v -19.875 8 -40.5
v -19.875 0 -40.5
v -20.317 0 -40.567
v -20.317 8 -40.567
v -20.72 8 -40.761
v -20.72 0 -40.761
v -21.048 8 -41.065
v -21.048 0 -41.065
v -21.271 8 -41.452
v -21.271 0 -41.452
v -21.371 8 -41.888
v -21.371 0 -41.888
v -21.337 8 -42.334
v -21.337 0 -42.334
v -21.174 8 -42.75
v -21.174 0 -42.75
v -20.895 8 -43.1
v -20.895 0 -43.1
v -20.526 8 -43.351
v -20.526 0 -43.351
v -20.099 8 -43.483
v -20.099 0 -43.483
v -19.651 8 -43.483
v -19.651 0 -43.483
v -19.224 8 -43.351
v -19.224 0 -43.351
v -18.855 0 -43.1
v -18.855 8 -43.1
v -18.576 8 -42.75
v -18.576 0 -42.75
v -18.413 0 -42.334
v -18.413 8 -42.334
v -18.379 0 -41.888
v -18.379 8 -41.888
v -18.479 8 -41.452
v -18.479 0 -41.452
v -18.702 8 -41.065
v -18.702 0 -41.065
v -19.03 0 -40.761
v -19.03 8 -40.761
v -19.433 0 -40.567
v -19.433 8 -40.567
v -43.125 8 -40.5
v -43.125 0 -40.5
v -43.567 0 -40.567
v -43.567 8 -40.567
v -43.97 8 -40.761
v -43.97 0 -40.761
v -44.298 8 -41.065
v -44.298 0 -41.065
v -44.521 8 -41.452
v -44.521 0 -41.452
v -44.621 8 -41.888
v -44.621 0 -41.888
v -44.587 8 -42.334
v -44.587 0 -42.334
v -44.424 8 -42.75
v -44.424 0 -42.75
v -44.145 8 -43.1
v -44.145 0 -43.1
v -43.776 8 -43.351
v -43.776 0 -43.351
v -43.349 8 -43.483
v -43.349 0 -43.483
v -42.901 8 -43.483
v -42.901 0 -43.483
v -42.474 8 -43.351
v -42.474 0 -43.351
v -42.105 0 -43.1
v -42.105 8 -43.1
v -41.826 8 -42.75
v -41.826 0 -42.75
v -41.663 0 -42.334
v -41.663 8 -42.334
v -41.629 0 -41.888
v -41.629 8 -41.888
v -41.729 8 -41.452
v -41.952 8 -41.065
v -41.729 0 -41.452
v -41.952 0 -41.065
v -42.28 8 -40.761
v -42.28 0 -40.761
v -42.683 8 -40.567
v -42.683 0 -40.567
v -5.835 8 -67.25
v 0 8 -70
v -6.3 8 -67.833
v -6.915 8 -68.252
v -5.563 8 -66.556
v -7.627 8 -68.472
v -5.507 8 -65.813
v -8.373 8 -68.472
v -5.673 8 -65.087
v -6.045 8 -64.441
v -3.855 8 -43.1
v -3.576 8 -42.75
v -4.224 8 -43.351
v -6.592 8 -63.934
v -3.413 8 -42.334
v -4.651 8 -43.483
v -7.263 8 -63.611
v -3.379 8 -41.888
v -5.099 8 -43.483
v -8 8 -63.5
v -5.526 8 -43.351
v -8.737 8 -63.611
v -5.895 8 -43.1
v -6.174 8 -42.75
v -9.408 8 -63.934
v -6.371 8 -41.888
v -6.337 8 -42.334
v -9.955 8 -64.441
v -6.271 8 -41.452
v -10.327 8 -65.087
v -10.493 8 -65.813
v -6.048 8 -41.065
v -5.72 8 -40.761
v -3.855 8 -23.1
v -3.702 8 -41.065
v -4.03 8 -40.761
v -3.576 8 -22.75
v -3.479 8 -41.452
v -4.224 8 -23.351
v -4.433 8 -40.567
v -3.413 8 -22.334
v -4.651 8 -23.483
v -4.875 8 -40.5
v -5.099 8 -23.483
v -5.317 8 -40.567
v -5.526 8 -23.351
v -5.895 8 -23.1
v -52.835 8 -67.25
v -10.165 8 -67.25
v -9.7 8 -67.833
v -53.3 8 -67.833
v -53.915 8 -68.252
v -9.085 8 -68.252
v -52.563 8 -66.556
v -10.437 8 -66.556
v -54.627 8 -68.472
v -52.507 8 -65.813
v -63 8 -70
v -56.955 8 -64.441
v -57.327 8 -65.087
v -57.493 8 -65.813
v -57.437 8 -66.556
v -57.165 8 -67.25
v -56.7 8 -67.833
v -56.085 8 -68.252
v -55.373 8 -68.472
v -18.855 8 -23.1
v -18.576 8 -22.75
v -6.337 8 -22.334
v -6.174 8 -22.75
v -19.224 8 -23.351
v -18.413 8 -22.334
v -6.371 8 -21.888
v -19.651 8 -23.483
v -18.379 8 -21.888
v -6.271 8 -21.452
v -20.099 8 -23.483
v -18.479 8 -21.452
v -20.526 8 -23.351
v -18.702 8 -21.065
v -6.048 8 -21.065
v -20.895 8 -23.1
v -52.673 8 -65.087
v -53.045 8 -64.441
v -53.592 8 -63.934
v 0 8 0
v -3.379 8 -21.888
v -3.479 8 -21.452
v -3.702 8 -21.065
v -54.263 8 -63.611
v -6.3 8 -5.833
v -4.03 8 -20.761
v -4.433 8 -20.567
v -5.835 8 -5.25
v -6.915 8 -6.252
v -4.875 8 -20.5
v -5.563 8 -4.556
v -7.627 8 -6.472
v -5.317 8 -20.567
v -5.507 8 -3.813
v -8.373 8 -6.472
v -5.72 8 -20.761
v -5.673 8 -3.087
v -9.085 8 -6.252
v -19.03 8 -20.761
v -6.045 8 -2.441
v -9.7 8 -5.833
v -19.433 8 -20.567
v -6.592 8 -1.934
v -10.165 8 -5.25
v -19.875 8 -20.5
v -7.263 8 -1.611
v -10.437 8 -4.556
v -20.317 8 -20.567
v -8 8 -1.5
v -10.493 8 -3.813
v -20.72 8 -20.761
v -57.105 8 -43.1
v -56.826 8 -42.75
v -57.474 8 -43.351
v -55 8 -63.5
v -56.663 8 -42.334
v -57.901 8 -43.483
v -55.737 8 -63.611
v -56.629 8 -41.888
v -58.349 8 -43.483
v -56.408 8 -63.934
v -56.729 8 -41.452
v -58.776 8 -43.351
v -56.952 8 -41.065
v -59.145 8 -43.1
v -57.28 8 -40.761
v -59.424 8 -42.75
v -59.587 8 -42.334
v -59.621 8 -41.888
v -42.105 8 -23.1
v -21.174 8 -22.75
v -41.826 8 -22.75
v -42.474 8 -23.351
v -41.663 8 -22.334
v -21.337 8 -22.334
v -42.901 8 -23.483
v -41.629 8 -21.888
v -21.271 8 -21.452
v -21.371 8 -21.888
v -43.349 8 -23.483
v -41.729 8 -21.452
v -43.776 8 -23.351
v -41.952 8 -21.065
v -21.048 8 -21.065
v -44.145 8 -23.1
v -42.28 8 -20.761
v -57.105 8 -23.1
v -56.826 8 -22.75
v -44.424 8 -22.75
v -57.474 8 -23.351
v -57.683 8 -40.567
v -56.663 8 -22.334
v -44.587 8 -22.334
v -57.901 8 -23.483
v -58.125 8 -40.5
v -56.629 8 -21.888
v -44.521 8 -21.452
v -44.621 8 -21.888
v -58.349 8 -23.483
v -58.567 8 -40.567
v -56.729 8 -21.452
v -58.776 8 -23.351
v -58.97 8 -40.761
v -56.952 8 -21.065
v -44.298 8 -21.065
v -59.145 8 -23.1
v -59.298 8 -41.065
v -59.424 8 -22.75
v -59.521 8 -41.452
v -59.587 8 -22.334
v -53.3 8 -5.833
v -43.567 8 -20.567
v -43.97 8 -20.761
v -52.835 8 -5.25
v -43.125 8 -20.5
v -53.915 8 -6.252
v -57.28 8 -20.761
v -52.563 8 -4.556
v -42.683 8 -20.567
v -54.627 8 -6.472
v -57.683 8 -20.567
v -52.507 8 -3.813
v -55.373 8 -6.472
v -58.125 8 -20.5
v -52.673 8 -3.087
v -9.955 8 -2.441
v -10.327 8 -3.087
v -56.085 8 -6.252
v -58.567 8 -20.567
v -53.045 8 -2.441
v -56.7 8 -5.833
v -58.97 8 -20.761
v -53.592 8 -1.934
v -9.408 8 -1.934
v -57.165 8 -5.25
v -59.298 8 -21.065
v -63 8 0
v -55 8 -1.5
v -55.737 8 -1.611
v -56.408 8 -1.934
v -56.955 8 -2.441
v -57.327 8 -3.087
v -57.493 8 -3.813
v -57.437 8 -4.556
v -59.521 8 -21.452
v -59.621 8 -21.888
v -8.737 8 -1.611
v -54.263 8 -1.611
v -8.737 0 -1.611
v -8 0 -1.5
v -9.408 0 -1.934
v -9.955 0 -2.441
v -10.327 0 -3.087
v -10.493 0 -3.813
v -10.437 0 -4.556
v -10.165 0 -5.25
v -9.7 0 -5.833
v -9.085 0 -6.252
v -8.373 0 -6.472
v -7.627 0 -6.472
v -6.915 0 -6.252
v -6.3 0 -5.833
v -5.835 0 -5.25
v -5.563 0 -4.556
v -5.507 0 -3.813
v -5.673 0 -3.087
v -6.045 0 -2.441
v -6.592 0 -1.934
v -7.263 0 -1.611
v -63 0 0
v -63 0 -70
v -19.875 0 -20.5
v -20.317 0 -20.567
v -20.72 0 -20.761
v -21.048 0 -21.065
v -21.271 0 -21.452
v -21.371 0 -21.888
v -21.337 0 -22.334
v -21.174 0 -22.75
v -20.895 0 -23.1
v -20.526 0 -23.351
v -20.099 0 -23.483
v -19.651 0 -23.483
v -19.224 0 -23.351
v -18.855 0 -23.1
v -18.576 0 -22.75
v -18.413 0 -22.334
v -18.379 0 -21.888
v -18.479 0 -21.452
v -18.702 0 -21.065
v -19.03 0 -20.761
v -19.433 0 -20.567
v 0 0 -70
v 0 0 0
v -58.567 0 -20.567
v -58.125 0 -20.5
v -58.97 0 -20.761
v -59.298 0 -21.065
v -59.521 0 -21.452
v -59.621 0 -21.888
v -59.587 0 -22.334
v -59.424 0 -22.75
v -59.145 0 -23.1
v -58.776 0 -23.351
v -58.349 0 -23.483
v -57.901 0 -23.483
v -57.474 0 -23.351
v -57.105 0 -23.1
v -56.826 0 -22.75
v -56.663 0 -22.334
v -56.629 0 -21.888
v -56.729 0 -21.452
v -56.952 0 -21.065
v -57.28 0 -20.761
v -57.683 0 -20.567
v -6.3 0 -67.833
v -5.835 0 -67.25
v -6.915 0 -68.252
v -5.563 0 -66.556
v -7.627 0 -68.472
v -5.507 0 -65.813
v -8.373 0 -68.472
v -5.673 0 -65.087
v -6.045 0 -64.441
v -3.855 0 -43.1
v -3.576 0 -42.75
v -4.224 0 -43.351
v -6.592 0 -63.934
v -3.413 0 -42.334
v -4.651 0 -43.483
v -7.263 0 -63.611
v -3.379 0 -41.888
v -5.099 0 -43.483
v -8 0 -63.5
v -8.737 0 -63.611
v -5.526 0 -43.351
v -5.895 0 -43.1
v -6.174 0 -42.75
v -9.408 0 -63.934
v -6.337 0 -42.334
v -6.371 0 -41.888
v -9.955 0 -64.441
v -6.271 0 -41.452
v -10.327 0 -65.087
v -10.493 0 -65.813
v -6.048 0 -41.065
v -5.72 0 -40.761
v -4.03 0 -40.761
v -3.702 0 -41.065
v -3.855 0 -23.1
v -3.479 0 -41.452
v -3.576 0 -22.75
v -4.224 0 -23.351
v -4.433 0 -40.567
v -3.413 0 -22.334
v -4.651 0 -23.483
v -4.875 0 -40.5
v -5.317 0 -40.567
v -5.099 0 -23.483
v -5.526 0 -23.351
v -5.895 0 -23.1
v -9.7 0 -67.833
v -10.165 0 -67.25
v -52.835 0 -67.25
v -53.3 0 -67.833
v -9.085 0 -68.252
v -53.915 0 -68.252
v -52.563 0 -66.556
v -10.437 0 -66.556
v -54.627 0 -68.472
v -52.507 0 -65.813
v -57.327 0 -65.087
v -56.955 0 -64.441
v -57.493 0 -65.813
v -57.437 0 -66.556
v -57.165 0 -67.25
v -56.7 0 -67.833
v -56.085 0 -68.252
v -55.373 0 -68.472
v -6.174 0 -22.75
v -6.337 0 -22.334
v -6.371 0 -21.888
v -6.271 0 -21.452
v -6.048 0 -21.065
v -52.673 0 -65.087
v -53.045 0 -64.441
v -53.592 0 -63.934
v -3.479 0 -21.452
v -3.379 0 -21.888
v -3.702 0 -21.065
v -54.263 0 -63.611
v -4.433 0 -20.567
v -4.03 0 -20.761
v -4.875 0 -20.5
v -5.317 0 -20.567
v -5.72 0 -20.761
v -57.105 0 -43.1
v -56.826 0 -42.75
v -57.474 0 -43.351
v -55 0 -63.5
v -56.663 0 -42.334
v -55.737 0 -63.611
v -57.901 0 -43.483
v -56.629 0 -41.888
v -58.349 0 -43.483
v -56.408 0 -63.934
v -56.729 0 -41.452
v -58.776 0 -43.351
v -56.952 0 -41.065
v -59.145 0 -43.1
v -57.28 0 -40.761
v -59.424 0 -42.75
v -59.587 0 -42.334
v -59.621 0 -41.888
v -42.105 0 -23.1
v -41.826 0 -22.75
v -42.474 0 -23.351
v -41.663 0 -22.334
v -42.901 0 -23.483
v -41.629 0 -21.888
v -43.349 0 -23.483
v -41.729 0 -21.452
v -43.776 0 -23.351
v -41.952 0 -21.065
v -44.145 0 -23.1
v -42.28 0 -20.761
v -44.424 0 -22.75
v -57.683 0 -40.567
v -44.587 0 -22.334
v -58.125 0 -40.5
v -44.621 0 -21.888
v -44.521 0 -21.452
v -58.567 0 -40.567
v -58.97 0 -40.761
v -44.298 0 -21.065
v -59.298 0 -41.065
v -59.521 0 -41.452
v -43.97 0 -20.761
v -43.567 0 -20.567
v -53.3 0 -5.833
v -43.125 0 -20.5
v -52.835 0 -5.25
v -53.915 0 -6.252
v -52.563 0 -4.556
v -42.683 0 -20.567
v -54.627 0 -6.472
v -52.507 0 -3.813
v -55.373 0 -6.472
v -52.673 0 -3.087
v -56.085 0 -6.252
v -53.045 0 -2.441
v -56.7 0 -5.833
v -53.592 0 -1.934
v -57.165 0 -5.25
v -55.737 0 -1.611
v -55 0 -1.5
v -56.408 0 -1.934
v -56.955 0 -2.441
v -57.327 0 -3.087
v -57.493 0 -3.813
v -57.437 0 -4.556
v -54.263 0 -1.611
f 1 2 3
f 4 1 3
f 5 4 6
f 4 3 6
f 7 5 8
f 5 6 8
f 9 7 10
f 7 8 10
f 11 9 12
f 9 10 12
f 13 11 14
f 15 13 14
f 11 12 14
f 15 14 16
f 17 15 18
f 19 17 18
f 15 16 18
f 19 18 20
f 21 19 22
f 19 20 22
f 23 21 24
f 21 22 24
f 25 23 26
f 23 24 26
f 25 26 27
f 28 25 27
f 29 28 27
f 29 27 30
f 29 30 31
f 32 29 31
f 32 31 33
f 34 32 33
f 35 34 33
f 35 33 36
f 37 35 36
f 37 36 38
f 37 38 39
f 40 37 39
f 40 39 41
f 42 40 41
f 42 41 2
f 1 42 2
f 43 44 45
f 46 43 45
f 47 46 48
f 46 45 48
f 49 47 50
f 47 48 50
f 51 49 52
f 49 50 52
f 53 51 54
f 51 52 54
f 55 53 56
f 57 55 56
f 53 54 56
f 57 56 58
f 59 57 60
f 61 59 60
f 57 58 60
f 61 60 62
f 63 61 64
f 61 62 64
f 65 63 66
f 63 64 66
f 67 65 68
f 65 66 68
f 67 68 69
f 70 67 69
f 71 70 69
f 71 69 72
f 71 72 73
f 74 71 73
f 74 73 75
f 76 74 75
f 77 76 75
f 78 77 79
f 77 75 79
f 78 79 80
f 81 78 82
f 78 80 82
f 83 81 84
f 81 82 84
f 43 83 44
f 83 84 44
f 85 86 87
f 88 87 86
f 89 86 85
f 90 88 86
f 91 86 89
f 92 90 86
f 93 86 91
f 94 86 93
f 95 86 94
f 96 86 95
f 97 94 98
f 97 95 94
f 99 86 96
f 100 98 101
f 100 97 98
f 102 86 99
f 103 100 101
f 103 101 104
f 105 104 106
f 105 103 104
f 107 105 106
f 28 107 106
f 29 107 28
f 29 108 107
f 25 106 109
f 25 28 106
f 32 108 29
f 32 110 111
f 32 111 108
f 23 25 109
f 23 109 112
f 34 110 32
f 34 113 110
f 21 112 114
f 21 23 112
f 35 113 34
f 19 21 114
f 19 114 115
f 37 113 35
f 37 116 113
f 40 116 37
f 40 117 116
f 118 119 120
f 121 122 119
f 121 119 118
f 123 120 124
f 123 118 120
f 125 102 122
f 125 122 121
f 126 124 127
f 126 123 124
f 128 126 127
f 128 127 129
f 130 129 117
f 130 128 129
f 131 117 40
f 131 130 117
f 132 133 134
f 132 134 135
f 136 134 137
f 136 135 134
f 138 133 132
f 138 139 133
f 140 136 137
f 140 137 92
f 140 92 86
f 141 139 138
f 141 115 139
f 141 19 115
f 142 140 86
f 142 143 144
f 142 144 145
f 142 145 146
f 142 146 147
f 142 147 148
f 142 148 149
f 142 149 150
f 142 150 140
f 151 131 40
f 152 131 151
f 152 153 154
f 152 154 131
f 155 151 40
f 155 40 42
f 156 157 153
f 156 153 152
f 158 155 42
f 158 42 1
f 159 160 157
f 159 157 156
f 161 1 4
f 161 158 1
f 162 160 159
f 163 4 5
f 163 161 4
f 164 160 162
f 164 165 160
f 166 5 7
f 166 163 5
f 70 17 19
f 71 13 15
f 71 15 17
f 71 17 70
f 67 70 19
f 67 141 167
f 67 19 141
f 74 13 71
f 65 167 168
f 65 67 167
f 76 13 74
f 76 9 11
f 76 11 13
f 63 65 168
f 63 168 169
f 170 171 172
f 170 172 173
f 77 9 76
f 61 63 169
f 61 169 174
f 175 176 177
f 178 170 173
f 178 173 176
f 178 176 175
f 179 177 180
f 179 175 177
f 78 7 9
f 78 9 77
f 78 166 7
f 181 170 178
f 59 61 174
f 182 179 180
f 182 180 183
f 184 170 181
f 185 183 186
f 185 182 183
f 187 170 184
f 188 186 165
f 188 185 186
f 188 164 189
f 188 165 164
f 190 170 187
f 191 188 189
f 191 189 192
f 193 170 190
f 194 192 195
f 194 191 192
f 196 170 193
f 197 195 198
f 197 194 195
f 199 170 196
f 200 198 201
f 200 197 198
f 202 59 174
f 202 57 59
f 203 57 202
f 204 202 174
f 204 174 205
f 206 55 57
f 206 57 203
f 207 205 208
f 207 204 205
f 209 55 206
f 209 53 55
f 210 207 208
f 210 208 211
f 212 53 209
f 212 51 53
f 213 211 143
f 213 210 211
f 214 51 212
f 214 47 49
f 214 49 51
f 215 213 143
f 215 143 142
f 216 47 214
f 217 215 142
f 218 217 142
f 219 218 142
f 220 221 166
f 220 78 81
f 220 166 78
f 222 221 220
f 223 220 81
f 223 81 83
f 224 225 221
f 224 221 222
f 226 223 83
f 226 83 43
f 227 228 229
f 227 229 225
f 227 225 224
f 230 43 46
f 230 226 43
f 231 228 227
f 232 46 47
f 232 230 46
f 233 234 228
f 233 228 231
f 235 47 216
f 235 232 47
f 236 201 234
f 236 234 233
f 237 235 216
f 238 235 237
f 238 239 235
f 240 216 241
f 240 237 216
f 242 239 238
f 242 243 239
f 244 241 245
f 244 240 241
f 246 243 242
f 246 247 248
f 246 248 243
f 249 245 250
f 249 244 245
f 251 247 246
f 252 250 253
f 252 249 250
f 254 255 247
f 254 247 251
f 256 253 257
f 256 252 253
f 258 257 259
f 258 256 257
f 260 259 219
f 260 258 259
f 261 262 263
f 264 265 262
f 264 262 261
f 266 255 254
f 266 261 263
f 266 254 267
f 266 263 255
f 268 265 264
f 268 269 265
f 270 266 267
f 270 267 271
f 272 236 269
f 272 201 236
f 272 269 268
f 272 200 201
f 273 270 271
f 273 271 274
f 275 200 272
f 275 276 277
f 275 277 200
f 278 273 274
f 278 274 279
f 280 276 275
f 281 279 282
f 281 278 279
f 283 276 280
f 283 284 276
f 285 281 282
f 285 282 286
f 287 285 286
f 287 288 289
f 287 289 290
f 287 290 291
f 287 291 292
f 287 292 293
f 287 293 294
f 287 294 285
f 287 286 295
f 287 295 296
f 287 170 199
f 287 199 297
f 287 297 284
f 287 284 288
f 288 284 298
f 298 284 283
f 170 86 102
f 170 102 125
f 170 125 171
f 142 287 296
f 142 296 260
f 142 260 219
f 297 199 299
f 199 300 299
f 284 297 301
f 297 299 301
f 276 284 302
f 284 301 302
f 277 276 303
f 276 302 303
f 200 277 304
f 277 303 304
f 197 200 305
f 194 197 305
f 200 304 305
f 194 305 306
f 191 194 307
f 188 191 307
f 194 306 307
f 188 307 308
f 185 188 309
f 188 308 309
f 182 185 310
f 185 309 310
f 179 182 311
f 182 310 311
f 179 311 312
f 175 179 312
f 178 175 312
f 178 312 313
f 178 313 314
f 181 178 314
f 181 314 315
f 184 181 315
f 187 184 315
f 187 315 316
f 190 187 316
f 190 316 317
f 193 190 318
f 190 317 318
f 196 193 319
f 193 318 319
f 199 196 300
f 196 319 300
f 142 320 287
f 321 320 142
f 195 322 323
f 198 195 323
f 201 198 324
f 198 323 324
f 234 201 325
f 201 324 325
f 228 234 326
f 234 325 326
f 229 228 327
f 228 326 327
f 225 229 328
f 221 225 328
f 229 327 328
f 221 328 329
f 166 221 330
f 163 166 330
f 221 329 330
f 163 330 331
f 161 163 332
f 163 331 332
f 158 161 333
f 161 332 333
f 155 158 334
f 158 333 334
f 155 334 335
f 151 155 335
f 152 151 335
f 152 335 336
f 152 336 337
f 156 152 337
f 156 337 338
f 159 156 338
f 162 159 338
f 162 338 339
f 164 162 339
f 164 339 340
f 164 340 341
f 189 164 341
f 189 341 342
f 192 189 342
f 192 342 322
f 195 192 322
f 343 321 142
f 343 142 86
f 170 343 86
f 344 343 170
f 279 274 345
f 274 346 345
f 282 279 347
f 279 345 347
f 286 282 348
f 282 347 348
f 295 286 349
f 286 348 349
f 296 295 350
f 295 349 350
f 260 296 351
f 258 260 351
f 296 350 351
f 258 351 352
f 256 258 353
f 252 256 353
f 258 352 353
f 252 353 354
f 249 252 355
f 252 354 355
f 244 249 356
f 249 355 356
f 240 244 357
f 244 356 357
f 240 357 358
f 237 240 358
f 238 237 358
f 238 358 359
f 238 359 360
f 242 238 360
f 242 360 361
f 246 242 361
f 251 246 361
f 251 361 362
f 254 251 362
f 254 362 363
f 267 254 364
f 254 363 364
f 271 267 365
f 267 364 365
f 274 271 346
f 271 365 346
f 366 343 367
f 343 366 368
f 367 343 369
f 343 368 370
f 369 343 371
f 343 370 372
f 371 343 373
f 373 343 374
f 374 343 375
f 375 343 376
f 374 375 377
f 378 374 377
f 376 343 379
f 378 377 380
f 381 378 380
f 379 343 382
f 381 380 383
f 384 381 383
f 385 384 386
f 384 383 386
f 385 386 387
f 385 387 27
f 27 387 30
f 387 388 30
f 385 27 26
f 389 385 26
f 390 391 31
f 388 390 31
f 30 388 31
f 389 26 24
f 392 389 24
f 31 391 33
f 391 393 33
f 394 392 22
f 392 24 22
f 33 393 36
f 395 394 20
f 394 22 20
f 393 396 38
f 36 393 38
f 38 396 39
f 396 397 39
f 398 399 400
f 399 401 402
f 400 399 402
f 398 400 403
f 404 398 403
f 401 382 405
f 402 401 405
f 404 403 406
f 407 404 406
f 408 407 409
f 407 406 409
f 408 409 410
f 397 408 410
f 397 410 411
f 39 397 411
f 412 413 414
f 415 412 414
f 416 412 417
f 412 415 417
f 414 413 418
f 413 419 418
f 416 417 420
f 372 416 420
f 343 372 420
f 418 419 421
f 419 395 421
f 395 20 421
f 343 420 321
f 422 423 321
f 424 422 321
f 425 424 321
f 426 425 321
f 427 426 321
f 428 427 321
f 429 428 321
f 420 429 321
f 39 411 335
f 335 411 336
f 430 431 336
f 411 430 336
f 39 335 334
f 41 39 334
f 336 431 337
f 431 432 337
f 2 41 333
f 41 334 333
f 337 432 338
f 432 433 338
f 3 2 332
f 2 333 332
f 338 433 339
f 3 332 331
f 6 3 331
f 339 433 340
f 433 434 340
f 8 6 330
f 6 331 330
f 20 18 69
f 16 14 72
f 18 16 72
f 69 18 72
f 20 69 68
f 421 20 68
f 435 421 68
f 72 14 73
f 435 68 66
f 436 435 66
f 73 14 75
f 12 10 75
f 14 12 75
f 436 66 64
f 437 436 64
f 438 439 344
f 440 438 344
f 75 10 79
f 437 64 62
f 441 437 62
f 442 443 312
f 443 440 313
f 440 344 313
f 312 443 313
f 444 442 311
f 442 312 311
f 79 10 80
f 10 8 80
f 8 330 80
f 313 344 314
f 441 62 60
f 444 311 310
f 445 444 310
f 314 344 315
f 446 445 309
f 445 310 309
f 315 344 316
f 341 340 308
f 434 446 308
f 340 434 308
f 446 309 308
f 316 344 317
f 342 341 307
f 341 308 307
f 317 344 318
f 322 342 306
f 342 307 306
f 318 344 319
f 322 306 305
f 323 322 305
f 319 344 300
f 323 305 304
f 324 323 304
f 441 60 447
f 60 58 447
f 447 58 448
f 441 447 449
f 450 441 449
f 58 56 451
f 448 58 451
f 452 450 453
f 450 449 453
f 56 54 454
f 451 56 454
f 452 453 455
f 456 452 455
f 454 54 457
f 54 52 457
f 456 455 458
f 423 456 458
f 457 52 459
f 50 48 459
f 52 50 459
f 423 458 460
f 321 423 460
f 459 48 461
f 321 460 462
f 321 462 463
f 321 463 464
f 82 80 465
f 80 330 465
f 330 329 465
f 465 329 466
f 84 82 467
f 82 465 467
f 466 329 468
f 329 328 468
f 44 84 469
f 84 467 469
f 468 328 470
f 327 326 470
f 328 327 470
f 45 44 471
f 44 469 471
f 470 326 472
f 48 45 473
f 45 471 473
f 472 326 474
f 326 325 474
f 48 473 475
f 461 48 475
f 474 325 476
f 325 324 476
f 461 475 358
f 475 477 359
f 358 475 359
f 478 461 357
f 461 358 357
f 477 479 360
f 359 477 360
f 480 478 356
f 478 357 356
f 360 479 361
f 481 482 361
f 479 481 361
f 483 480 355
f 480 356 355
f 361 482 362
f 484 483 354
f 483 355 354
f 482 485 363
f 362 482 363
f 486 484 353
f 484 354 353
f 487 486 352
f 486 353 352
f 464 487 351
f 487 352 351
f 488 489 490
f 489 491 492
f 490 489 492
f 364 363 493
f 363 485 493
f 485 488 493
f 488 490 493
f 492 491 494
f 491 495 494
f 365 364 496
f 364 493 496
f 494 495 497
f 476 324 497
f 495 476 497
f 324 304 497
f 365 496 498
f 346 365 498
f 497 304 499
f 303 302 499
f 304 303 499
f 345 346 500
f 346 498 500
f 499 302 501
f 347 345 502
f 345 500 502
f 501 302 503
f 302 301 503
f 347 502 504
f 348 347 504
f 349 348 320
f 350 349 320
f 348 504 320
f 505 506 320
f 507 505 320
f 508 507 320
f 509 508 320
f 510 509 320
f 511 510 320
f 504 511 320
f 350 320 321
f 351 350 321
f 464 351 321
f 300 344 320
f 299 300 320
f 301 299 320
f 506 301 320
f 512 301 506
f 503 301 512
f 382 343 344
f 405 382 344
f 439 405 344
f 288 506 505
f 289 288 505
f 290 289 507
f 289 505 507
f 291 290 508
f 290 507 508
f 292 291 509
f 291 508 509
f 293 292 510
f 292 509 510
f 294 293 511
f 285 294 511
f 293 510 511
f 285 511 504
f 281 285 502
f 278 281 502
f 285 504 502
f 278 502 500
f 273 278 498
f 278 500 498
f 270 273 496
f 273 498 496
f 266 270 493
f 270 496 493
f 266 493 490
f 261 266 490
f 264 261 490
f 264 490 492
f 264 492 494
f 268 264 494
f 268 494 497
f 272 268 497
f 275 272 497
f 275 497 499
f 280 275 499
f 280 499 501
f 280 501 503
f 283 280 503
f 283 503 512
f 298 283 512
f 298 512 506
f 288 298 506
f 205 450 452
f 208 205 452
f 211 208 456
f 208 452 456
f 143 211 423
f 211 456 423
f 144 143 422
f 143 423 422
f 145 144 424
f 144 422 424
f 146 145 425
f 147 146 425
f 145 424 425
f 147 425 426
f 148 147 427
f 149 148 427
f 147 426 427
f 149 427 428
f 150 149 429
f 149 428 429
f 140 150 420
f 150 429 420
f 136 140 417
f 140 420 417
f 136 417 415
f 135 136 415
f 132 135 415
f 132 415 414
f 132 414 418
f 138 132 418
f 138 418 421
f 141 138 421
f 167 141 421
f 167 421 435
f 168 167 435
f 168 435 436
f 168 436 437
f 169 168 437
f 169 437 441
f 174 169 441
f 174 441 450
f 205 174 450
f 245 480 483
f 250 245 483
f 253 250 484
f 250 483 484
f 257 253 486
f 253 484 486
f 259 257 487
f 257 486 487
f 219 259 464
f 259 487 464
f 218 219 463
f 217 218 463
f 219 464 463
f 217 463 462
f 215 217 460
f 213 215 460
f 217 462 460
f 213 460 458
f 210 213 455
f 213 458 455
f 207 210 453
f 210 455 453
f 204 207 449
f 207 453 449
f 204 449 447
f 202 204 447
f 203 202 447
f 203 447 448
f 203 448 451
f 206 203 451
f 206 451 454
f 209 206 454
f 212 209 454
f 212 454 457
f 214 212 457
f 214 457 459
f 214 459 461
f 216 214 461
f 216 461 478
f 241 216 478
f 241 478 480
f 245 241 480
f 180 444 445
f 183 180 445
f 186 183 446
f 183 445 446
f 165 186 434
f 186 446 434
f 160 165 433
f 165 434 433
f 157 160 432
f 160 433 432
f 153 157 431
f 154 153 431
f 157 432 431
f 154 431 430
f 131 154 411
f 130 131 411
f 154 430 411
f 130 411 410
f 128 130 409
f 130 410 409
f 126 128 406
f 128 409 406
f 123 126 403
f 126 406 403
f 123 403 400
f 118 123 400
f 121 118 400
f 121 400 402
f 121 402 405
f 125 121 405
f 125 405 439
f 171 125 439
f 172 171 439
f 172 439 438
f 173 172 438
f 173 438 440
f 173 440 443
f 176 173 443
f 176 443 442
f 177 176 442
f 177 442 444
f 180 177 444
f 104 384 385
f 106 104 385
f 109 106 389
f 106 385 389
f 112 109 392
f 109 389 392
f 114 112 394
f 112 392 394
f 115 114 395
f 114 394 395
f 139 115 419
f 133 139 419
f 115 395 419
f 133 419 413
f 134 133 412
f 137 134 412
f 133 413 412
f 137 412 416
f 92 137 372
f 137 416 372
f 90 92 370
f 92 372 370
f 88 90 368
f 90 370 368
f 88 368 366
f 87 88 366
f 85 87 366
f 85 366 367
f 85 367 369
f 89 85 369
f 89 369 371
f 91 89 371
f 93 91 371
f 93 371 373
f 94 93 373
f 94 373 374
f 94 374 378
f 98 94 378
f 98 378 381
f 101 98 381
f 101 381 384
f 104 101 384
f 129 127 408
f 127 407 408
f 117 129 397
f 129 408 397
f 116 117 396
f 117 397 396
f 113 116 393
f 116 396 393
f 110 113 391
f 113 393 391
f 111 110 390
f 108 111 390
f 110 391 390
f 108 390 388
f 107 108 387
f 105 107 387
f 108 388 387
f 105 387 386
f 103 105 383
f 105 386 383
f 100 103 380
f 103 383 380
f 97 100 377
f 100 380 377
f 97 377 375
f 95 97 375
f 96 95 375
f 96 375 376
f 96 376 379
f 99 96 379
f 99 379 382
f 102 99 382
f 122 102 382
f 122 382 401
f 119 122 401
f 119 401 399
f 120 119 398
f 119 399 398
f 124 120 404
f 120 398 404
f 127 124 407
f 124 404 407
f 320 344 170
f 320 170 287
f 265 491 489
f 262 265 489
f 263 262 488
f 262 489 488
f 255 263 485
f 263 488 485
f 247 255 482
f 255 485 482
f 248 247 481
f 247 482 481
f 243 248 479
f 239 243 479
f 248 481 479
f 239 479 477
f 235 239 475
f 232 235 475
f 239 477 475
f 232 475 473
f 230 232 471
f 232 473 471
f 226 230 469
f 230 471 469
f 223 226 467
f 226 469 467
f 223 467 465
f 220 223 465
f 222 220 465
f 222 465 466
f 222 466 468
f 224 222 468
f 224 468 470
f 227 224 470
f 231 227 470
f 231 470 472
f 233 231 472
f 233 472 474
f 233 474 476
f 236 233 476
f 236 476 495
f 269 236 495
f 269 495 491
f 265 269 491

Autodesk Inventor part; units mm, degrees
ref_plane "YZ Plane" through (0, 0, 0) normal (1, 0, 0) x (0, 1, 0)
ref_plane "XZ Plane" through (0, 0, 0) normal (0, 1, 0) x (-1, 0, 0)
ref_plane "XY Plane" through (0, 0, 0) normal (0, 0, 1) x (1, 0, 0)
sketch "Sketch1" plane through (0, 0, 0) normal (0, 1, 0) x (-1, 0, 0)
  line L0 (0, 0) -> (63, 0)
  line L1 (63, 0) -> (63, -70)
  line L2 (63, -70) -> (0, -70)
  line L3 (0, -70) -> (0, 0)
  dimension "d0" = 70
  dimension "d1" = 63
extrude "Extrusion1" add sketch "Sketch1" along normal blind 8
sketch "Sketch2" plane through (0, 8, 0) normal (0, 1, 0) x (1, 0, 0)
  line L0 (0, 70) -> (-63, 70) projected
  line L1 (-63, 70) -> (-63, 0) projected
  line L2 (0, 0) -> (0, 70) projected
  point P0 (-58.125, 42)
  point P1 (-43.125, 42)
  point P2 (-58.125, 22)
  point P3 (-43.125, 22)
  point P4 (-19.875, 42)
  point P5 (-19.875, 22)
  point P6 (-4.875, 42)
  point P7 (-4.875, 22)
  dimension "d4" = 70
  dimension "d5" = 63
  dimension "d8" = 15
  dimension "d11" = 20
  dimension "d18" = 20
  dimension "d21" = 15
  dimension "d24" = 23.25
  dimension "d25" = 0
  dimension "d26" = 28
  dimension "d27" = 53.25
  dimension "d28" = -4.875
hole "Hole1" at (-58.125, 8, -42) at (-43.125, 8, -42) at (-58.125, 8, -22) at (-43.125, 8, -22) at (-19.875, 8, -42) at (-19.875, 8, -22) at (-4.875, 8, -42) at (-4.875, 8, -22) direction (0, -1, 0) diameter 3 end through all
sketch "Sketch3" plane through (0, 8, 0) normal (0, 1, 0) x (1, 0, 0)
  line L0 (0, 0) -> (0, 70) projected
  line L1 (-63, 0) -> (0, 0) projected
  point P0 (-8, 4)
  point P1 (-55, 4)
  point P2 (-8, 66)
  point P3 (-55, 66)
  dimension "d38" = 47
  dimension "d41" = 62
  dimension "d44" = 63
  dimension "d45" = 70
  dimension "d46" = 4
  dimension "d47" = 8
hole "Hole2" at (-8, 8, -4) at (-55, 8, -4) at (-8, 8, -66) at (-55, 8, -66) direction (0, -1, 0) diameter 5 end through all
equation "\"d28\" = 0.5 * d27 - 0.5 * d5"
equation "\"d34\" = Thickness"
equation "\"d46\" = 0.5 * d45 - 0.5 * d41"
equation "\"d47\" = 0.5 * d44 - 0.5 * d38"
equation "\"d53\" = Thickness"
equation "\"BendRadius\" = Thickness"
equation "\"BendReliefWidth\" = Thickness"
equation "\"BendReliefDepth\" = 0.5 * Thickness"
equation "\"CornerReliefSize\" = 4 * Thickness"
equation "\"MinimumRemnant\" = 2 * Thickness"
equation "\"TransitionRadius\" = BendRadius"
equation "\"JacobiRadiusSize\" = BendRadius"
equation "\"GapSize\" = Thickness"
equation "\"Thickness\" = 0.5"
properties part number "Lateral da caixa de sustentação" material "Aluminum 6061"
